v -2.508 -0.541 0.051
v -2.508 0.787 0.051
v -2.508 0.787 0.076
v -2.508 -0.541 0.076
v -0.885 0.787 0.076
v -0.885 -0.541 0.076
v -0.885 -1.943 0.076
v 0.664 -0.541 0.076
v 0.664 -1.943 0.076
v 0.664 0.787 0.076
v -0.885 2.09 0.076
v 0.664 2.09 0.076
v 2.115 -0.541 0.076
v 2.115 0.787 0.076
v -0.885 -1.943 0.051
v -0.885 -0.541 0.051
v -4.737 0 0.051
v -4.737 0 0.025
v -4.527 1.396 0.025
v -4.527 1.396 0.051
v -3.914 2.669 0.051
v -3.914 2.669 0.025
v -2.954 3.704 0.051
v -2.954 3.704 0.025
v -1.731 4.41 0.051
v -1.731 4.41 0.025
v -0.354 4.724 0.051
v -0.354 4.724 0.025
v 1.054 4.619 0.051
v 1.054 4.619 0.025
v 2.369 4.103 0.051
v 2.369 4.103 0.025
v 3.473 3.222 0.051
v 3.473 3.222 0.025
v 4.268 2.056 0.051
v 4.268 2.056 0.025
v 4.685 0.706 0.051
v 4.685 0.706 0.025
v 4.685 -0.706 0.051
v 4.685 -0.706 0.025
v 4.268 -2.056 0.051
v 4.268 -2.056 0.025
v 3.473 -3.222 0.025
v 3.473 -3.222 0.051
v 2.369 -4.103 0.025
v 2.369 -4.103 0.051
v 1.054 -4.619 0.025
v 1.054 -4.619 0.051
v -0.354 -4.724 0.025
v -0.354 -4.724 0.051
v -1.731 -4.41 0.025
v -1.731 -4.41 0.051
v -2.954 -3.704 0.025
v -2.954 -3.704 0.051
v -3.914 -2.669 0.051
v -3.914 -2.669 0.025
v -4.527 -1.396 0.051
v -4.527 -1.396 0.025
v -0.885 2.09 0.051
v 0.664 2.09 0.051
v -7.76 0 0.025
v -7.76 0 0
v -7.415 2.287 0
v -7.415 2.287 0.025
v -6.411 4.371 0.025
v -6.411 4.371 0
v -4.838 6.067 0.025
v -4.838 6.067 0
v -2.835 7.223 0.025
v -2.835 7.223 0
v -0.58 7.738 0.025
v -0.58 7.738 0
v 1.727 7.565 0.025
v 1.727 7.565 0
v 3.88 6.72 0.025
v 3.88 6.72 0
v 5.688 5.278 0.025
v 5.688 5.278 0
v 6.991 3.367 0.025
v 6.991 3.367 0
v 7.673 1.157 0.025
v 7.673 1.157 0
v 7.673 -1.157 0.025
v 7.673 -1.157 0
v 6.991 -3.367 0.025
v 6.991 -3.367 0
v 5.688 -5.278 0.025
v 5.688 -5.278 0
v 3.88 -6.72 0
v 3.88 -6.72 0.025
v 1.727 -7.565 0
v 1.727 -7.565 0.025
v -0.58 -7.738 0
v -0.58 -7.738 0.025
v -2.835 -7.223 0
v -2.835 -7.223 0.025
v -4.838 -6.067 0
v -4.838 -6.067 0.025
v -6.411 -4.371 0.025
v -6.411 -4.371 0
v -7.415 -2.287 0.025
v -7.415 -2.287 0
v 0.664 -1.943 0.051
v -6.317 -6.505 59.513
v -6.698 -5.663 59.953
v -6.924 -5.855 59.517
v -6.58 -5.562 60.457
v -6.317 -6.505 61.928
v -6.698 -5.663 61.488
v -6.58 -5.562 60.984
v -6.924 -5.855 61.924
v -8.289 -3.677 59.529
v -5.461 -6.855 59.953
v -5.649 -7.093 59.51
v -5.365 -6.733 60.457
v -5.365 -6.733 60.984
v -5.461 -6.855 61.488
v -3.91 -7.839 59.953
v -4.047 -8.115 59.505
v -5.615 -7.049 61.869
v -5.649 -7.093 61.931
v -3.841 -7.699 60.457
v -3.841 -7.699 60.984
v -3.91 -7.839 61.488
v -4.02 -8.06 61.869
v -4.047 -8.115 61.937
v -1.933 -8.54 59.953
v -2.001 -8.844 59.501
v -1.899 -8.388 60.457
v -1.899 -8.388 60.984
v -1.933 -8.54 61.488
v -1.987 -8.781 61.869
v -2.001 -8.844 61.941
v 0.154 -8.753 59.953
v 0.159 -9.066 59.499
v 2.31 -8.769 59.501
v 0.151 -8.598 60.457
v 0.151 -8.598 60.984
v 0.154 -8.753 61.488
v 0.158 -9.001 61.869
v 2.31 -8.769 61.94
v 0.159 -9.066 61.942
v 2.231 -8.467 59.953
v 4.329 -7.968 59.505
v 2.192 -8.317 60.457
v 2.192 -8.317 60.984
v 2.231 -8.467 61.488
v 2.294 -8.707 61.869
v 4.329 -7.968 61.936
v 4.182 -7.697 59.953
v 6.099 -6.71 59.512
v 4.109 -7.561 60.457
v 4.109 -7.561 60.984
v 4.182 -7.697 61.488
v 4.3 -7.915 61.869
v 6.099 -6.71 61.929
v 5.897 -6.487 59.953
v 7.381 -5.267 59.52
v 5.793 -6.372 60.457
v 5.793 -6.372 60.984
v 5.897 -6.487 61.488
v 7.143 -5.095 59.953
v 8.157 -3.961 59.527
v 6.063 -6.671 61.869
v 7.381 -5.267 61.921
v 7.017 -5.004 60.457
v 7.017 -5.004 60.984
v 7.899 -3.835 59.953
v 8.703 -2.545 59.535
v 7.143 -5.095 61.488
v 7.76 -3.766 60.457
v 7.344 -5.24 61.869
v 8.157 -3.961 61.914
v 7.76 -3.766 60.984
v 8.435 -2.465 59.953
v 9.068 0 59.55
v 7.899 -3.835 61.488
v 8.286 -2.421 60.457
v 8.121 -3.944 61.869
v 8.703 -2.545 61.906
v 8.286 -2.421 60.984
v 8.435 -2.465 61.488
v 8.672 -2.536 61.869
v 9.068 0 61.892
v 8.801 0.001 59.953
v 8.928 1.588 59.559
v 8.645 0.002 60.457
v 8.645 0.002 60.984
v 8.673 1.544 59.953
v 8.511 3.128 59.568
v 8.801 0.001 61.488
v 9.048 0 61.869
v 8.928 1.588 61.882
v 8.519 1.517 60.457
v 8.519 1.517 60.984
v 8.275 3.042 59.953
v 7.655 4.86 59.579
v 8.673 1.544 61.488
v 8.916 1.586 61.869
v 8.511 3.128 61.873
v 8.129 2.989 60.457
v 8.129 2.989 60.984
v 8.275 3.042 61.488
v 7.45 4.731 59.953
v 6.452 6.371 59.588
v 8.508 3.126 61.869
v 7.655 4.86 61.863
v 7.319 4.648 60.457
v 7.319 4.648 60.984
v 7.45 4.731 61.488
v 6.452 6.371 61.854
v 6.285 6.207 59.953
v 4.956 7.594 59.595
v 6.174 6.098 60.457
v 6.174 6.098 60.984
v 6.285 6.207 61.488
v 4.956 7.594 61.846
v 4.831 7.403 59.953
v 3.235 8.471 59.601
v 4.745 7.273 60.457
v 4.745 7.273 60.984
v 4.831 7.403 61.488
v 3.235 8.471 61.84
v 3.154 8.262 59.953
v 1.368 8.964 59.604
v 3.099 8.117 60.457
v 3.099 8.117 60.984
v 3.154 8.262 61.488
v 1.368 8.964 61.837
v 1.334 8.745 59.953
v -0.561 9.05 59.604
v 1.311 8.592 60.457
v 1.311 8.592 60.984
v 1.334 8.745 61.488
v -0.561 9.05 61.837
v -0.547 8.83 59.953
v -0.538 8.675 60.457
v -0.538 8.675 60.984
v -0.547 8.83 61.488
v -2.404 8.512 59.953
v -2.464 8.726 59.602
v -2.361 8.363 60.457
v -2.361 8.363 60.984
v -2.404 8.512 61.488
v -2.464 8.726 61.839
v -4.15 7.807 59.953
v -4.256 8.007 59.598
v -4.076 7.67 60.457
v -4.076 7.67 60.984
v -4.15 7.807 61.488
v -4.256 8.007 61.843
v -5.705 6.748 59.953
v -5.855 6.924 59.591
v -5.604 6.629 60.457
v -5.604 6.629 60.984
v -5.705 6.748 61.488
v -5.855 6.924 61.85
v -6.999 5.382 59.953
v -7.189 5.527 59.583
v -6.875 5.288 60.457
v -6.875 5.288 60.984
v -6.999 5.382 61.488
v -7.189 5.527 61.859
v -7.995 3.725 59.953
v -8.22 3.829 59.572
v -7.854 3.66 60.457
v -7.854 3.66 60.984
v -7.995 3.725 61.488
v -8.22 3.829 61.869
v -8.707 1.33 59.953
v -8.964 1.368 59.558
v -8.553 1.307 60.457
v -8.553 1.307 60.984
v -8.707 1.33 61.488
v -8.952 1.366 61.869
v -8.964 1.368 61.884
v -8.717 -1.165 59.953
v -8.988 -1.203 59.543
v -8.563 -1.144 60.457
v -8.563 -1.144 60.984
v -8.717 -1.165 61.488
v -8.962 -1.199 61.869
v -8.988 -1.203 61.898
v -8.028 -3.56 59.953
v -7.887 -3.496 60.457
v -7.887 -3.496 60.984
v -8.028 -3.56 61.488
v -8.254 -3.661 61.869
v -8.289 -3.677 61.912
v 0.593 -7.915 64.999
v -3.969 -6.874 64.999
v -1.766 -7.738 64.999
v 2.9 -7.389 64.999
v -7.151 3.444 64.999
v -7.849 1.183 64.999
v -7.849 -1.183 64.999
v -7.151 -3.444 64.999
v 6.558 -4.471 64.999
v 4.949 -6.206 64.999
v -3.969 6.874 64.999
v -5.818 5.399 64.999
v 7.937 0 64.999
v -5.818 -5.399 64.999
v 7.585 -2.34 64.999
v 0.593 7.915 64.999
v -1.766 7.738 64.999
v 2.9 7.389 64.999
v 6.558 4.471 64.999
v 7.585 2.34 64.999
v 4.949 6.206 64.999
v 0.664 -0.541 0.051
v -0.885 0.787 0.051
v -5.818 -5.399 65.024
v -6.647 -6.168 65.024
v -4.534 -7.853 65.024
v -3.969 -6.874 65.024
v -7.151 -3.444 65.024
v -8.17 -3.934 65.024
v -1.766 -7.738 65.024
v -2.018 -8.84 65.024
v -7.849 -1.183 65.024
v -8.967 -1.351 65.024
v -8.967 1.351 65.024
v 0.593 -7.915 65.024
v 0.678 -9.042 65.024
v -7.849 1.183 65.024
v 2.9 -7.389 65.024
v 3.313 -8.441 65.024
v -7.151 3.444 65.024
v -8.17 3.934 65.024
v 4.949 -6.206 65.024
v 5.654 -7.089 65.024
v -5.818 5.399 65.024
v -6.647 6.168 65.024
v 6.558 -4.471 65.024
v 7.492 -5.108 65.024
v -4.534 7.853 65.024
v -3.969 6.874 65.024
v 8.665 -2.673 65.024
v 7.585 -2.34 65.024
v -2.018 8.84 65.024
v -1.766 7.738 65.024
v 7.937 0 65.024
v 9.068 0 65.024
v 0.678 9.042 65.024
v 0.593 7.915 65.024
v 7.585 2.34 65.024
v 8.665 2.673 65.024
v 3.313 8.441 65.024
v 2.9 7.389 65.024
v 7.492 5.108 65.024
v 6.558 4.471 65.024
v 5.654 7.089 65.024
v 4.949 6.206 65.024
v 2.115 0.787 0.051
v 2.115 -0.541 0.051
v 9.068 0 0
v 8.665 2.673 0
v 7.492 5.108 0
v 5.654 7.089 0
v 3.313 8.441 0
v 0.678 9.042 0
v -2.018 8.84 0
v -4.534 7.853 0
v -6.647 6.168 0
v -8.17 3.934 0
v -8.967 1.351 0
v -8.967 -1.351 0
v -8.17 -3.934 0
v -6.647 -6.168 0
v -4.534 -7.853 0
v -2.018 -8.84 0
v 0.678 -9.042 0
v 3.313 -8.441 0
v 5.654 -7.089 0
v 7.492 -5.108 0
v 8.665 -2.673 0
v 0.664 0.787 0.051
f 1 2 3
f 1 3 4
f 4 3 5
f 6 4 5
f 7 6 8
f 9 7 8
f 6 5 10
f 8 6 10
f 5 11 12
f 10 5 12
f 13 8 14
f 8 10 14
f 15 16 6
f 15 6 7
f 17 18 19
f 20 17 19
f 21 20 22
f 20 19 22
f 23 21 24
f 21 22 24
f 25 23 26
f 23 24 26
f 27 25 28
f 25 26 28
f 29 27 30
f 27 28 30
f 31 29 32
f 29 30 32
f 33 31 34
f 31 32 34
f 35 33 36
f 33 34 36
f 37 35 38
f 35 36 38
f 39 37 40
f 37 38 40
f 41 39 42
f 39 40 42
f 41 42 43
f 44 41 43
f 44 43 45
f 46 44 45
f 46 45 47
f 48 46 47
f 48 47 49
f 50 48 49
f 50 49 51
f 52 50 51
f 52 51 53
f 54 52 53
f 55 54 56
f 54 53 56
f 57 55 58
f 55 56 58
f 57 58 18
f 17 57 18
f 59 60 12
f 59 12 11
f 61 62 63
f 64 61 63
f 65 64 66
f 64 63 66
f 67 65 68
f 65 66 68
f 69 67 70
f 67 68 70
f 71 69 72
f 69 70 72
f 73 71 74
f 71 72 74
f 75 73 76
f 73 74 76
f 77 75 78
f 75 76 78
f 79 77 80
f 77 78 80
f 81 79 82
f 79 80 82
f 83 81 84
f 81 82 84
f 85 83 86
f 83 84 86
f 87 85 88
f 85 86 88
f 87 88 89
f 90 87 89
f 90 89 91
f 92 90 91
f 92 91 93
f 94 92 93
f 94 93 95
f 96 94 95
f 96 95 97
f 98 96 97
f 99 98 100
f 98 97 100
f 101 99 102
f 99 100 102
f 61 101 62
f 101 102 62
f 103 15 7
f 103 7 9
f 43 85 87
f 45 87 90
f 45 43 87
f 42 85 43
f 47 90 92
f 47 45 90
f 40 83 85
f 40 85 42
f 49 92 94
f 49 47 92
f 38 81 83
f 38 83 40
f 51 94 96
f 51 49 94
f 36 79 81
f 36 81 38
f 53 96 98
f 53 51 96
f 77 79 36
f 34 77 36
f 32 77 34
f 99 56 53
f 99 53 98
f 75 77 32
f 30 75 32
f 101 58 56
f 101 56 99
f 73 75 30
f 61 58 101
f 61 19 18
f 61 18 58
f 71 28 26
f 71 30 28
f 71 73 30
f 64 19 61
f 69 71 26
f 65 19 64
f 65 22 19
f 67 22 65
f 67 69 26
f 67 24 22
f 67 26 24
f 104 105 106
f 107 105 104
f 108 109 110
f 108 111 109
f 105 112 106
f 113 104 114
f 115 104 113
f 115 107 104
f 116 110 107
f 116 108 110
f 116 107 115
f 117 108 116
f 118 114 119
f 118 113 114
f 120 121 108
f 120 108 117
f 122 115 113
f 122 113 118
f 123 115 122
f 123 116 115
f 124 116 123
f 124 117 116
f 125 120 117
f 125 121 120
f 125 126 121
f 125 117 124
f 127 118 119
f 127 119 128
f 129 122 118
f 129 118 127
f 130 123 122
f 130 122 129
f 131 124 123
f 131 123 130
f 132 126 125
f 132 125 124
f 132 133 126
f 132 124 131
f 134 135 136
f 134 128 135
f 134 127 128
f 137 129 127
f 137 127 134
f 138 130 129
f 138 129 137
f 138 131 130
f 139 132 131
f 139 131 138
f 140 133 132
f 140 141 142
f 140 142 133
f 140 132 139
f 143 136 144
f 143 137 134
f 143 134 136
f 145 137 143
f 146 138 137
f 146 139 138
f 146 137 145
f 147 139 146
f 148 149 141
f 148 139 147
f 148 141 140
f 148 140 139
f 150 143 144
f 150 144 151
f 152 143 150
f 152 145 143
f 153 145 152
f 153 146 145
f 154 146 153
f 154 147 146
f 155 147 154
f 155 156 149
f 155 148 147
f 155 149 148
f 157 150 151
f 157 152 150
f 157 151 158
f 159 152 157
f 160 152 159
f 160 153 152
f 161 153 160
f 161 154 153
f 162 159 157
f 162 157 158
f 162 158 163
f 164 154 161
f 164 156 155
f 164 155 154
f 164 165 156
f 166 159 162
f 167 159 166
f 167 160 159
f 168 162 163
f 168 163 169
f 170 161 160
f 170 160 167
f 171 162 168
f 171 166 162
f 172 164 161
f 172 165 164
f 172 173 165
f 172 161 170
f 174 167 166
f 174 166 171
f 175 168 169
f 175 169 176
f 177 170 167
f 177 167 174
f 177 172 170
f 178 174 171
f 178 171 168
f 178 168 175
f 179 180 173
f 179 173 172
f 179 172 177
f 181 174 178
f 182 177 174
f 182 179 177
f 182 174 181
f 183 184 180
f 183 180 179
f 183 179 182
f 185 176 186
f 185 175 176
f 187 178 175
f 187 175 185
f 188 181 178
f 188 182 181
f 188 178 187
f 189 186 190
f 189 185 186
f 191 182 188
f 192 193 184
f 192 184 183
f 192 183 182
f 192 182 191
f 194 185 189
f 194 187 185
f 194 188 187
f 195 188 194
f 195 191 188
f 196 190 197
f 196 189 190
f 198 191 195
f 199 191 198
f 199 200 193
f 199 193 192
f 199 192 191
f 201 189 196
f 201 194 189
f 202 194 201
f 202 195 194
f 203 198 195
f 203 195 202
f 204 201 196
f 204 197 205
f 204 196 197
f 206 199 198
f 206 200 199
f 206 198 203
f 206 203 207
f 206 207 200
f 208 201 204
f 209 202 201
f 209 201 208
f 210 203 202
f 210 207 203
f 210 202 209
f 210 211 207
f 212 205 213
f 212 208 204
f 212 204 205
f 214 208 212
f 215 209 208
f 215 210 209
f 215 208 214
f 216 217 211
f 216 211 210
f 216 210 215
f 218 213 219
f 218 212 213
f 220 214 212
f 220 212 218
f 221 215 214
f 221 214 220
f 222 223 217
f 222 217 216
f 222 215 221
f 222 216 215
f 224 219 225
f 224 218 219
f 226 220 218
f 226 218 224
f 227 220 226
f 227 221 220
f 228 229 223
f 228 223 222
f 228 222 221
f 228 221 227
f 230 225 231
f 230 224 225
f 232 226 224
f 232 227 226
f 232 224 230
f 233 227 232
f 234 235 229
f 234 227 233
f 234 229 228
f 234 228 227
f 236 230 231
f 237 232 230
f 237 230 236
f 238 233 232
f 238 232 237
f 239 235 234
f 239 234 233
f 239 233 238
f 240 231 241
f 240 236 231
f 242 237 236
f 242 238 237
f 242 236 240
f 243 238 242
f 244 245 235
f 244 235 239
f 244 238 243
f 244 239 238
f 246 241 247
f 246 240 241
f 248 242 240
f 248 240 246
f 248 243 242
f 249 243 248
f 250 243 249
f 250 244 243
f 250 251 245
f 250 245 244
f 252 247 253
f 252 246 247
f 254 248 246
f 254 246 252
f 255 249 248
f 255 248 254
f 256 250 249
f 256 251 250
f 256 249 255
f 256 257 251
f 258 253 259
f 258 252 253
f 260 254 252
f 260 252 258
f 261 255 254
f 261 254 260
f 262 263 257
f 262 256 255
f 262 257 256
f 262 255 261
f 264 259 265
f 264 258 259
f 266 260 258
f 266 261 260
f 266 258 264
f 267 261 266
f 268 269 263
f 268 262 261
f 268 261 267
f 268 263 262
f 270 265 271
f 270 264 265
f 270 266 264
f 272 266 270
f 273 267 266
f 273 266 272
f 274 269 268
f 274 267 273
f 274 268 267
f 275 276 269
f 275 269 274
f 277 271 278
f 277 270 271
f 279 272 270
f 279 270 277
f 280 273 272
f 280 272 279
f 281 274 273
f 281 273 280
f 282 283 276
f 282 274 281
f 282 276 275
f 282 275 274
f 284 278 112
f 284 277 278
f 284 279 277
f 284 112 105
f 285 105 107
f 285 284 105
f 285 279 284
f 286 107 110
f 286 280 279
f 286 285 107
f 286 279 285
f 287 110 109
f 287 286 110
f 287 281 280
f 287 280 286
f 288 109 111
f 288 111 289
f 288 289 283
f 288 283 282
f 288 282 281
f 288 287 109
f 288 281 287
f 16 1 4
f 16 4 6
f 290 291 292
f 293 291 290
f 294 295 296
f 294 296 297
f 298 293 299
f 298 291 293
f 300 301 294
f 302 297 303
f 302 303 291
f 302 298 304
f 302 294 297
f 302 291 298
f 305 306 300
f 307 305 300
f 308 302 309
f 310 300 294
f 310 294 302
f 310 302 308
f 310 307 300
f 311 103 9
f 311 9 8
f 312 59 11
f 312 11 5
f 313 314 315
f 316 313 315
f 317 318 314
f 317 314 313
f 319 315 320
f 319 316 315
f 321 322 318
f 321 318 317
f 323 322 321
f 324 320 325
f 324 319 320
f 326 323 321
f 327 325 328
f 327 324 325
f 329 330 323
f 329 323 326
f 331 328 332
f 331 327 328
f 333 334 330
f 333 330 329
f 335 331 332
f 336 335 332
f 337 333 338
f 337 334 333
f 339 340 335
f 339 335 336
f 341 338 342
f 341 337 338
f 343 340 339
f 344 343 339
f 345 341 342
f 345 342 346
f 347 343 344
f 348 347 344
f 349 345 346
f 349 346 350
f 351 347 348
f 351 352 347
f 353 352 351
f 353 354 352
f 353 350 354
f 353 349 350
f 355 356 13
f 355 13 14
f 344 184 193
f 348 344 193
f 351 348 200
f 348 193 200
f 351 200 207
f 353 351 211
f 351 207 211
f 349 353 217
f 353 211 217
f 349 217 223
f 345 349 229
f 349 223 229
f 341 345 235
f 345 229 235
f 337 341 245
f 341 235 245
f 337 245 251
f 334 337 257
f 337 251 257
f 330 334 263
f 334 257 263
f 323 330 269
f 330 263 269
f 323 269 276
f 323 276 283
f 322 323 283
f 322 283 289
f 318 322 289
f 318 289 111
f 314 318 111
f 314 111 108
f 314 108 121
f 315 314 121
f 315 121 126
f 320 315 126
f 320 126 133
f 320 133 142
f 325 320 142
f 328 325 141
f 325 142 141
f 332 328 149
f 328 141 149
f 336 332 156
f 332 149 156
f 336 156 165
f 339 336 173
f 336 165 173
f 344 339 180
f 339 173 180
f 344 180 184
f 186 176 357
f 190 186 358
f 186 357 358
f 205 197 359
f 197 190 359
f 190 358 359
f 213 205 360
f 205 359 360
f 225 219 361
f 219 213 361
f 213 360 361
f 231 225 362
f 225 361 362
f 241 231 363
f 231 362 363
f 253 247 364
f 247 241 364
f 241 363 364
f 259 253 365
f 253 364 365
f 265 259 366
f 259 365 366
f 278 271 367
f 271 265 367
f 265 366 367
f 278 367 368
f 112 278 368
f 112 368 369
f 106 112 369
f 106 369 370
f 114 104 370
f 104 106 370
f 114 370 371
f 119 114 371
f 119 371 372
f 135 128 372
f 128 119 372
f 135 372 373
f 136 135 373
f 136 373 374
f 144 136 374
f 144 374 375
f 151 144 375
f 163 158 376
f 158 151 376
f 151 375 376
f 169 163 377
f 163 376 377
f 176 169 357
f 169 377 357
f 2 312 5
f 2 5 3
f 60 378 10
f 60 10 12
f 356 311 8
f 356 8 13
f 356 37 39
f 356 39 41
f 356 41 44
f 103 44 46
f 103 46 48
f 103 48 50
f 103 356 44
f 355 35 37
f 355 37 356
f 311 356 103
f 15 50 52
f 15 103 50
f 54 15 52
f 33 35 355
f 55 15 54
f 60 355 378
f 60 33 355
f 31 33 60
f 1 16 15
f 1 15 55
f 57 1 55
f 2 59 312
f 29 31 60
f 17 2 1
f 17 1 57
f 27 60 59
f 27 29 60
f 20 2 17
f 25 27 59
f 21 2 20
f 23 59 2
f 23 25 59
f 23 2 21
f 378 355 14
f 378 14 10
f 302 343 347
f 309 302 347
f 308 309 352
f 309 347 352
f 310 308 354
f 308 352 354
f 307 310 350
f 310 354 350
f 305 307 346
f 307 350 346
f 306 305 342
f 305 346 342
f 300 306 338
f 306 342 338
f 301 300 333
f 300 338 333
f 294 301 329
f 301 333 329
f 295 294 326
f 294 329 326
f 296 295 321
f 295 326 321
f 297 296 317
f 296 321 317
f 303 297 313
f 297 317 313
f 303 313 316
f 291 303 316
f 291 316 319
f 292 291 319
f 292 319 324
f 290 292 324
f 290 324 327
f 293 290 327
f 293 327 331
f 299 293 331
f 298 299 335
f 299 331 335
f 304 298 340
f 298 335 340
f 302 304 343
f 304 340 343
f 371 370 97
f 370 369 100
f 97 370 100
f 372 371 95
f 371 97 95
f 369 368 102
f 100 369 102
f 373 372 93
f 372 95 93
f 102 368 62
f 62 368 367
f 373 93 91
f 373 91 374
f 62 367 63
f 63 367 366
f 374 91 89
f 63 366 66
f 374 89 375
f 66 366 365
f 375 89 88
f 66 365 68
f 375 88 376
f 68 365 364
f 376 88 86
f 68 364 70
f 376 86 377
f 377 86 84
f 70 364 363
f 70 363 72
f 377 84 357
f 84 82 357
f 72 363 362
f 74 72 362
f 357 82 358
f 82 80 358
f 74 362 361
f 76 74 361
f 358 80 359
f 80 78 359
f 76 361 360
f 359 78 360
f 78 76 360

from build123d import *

# Parameters (mm, degrees)
SKETCH1_R           = 9.0678
BOSS_EXTRUDE1_DEPTH = 65.024
SKETCH4_R           = 7.937216361
CUT_EXTRUDE1_DEPTH  = 0.0254
SKETCH5_R           = 7.759625111
CUT_EXTRUDE2_DEPTH  = 0.0254
SKETCH6_R           = 4.737479436
CUT_EXTRUDE3_DEPTH  = 0.0254
CUT_EXTRUDE4_DEPTH  = 0.0254


with BuildPart() as part:
    # Sketch1 → Boss-Extrude1 (new body)
    with BuildSketch(Plane.XY):
        Circle(SKETCH1_R)
    extrude(amount=BOSS_EXTRUDE1_DEPTH)

    # Sketch2 → Cut-Revolve9 (revolve, cut)
    with BuildSketch(Plane(origin=(0, 0, 0), x_dir=(0, 0, -1), z_dir=(1, 0, 0)), mode=Mode.PRIVATE) as cut_revolve9_sk:
        with BuildLine():
            Line((-61.980472201, 9.198093657), (-59.460775409, 9.198093657))
            ThreePointArc((-59.460775409, 9.198093657), (-60.720623805, 8.672006552), (-61.980472201, 9.198093657))
        make_face()
    revolve(cut_revolve9_sk.sketch.rotate(Axis((0, 0.04619124, -3.327942322), (0, 0, 1)), 130.442191922), axis=Axis((0, 0.04619124, -3.327942322), (0, 0, 1)), mode=Mode.SUBTRACT)

    # Sketch4 → Cut-Extrude1 (cut)
    with BuildSketch(Plane.XY.offset(65.024)):
        Circle(SKETCH4_R)
    extrude(amount=-CUT_EXTRUDE1_DEPTH, mode=Mode.SUBTRACT)

    # Sketch5 → Cut-Extrude2 (cut)
    with BuildSketch(Plane(origin=(0, 0, 0), x_dir=(-1, 0, 0), z_dir=(0, 0, -1))):
        Circle(SKETCH5_R)
    extrude(amount=-CUT_EXTRUDE2_DEPTH, mode=Mode.SUBTRACT)

    # Sketch6 → Cut-Extrude3 (cut)
    with BuildSketch(Plane(origin=(0, 0, 0.0254), x_dir=(-1, 0, 0), z_dir=(0, 0, -1))):
        Circle(SKETCH6_R)
    extrude(amount=-CUT_EXTRUDE3_DEPTH, mode=Mode.SUBTRACT)

    # Sketch7 → Cut-Extrude4 (cut)
    with BuildSketch(Plane(origin=(0, 0, 0.0508), x_dir=(-1, 0, 0), z_dir=(0, 0, -1))):
        Polygon((0.885352187, 0.786979722), (2.508497864, 0.786979722), (2.508497864, -0.541048559), (0.885352187, -0.541048559), (0.885352187, -1.942856189), (-0.664014141, -1.942856189), (-0.664014141, -0.541048559), (-2.115008003, -0.541048559), (-2.115008003, 0.786979722), (-0.664014141, 0.786979722), (-0.664014141, 2.090414887), (0.885352187, 2.090414887), align=None)
    extrude(amount=-CUT_EXTRUDE4_DEPTH, mode=Mode.SUBTRACT)


solid = part.part
